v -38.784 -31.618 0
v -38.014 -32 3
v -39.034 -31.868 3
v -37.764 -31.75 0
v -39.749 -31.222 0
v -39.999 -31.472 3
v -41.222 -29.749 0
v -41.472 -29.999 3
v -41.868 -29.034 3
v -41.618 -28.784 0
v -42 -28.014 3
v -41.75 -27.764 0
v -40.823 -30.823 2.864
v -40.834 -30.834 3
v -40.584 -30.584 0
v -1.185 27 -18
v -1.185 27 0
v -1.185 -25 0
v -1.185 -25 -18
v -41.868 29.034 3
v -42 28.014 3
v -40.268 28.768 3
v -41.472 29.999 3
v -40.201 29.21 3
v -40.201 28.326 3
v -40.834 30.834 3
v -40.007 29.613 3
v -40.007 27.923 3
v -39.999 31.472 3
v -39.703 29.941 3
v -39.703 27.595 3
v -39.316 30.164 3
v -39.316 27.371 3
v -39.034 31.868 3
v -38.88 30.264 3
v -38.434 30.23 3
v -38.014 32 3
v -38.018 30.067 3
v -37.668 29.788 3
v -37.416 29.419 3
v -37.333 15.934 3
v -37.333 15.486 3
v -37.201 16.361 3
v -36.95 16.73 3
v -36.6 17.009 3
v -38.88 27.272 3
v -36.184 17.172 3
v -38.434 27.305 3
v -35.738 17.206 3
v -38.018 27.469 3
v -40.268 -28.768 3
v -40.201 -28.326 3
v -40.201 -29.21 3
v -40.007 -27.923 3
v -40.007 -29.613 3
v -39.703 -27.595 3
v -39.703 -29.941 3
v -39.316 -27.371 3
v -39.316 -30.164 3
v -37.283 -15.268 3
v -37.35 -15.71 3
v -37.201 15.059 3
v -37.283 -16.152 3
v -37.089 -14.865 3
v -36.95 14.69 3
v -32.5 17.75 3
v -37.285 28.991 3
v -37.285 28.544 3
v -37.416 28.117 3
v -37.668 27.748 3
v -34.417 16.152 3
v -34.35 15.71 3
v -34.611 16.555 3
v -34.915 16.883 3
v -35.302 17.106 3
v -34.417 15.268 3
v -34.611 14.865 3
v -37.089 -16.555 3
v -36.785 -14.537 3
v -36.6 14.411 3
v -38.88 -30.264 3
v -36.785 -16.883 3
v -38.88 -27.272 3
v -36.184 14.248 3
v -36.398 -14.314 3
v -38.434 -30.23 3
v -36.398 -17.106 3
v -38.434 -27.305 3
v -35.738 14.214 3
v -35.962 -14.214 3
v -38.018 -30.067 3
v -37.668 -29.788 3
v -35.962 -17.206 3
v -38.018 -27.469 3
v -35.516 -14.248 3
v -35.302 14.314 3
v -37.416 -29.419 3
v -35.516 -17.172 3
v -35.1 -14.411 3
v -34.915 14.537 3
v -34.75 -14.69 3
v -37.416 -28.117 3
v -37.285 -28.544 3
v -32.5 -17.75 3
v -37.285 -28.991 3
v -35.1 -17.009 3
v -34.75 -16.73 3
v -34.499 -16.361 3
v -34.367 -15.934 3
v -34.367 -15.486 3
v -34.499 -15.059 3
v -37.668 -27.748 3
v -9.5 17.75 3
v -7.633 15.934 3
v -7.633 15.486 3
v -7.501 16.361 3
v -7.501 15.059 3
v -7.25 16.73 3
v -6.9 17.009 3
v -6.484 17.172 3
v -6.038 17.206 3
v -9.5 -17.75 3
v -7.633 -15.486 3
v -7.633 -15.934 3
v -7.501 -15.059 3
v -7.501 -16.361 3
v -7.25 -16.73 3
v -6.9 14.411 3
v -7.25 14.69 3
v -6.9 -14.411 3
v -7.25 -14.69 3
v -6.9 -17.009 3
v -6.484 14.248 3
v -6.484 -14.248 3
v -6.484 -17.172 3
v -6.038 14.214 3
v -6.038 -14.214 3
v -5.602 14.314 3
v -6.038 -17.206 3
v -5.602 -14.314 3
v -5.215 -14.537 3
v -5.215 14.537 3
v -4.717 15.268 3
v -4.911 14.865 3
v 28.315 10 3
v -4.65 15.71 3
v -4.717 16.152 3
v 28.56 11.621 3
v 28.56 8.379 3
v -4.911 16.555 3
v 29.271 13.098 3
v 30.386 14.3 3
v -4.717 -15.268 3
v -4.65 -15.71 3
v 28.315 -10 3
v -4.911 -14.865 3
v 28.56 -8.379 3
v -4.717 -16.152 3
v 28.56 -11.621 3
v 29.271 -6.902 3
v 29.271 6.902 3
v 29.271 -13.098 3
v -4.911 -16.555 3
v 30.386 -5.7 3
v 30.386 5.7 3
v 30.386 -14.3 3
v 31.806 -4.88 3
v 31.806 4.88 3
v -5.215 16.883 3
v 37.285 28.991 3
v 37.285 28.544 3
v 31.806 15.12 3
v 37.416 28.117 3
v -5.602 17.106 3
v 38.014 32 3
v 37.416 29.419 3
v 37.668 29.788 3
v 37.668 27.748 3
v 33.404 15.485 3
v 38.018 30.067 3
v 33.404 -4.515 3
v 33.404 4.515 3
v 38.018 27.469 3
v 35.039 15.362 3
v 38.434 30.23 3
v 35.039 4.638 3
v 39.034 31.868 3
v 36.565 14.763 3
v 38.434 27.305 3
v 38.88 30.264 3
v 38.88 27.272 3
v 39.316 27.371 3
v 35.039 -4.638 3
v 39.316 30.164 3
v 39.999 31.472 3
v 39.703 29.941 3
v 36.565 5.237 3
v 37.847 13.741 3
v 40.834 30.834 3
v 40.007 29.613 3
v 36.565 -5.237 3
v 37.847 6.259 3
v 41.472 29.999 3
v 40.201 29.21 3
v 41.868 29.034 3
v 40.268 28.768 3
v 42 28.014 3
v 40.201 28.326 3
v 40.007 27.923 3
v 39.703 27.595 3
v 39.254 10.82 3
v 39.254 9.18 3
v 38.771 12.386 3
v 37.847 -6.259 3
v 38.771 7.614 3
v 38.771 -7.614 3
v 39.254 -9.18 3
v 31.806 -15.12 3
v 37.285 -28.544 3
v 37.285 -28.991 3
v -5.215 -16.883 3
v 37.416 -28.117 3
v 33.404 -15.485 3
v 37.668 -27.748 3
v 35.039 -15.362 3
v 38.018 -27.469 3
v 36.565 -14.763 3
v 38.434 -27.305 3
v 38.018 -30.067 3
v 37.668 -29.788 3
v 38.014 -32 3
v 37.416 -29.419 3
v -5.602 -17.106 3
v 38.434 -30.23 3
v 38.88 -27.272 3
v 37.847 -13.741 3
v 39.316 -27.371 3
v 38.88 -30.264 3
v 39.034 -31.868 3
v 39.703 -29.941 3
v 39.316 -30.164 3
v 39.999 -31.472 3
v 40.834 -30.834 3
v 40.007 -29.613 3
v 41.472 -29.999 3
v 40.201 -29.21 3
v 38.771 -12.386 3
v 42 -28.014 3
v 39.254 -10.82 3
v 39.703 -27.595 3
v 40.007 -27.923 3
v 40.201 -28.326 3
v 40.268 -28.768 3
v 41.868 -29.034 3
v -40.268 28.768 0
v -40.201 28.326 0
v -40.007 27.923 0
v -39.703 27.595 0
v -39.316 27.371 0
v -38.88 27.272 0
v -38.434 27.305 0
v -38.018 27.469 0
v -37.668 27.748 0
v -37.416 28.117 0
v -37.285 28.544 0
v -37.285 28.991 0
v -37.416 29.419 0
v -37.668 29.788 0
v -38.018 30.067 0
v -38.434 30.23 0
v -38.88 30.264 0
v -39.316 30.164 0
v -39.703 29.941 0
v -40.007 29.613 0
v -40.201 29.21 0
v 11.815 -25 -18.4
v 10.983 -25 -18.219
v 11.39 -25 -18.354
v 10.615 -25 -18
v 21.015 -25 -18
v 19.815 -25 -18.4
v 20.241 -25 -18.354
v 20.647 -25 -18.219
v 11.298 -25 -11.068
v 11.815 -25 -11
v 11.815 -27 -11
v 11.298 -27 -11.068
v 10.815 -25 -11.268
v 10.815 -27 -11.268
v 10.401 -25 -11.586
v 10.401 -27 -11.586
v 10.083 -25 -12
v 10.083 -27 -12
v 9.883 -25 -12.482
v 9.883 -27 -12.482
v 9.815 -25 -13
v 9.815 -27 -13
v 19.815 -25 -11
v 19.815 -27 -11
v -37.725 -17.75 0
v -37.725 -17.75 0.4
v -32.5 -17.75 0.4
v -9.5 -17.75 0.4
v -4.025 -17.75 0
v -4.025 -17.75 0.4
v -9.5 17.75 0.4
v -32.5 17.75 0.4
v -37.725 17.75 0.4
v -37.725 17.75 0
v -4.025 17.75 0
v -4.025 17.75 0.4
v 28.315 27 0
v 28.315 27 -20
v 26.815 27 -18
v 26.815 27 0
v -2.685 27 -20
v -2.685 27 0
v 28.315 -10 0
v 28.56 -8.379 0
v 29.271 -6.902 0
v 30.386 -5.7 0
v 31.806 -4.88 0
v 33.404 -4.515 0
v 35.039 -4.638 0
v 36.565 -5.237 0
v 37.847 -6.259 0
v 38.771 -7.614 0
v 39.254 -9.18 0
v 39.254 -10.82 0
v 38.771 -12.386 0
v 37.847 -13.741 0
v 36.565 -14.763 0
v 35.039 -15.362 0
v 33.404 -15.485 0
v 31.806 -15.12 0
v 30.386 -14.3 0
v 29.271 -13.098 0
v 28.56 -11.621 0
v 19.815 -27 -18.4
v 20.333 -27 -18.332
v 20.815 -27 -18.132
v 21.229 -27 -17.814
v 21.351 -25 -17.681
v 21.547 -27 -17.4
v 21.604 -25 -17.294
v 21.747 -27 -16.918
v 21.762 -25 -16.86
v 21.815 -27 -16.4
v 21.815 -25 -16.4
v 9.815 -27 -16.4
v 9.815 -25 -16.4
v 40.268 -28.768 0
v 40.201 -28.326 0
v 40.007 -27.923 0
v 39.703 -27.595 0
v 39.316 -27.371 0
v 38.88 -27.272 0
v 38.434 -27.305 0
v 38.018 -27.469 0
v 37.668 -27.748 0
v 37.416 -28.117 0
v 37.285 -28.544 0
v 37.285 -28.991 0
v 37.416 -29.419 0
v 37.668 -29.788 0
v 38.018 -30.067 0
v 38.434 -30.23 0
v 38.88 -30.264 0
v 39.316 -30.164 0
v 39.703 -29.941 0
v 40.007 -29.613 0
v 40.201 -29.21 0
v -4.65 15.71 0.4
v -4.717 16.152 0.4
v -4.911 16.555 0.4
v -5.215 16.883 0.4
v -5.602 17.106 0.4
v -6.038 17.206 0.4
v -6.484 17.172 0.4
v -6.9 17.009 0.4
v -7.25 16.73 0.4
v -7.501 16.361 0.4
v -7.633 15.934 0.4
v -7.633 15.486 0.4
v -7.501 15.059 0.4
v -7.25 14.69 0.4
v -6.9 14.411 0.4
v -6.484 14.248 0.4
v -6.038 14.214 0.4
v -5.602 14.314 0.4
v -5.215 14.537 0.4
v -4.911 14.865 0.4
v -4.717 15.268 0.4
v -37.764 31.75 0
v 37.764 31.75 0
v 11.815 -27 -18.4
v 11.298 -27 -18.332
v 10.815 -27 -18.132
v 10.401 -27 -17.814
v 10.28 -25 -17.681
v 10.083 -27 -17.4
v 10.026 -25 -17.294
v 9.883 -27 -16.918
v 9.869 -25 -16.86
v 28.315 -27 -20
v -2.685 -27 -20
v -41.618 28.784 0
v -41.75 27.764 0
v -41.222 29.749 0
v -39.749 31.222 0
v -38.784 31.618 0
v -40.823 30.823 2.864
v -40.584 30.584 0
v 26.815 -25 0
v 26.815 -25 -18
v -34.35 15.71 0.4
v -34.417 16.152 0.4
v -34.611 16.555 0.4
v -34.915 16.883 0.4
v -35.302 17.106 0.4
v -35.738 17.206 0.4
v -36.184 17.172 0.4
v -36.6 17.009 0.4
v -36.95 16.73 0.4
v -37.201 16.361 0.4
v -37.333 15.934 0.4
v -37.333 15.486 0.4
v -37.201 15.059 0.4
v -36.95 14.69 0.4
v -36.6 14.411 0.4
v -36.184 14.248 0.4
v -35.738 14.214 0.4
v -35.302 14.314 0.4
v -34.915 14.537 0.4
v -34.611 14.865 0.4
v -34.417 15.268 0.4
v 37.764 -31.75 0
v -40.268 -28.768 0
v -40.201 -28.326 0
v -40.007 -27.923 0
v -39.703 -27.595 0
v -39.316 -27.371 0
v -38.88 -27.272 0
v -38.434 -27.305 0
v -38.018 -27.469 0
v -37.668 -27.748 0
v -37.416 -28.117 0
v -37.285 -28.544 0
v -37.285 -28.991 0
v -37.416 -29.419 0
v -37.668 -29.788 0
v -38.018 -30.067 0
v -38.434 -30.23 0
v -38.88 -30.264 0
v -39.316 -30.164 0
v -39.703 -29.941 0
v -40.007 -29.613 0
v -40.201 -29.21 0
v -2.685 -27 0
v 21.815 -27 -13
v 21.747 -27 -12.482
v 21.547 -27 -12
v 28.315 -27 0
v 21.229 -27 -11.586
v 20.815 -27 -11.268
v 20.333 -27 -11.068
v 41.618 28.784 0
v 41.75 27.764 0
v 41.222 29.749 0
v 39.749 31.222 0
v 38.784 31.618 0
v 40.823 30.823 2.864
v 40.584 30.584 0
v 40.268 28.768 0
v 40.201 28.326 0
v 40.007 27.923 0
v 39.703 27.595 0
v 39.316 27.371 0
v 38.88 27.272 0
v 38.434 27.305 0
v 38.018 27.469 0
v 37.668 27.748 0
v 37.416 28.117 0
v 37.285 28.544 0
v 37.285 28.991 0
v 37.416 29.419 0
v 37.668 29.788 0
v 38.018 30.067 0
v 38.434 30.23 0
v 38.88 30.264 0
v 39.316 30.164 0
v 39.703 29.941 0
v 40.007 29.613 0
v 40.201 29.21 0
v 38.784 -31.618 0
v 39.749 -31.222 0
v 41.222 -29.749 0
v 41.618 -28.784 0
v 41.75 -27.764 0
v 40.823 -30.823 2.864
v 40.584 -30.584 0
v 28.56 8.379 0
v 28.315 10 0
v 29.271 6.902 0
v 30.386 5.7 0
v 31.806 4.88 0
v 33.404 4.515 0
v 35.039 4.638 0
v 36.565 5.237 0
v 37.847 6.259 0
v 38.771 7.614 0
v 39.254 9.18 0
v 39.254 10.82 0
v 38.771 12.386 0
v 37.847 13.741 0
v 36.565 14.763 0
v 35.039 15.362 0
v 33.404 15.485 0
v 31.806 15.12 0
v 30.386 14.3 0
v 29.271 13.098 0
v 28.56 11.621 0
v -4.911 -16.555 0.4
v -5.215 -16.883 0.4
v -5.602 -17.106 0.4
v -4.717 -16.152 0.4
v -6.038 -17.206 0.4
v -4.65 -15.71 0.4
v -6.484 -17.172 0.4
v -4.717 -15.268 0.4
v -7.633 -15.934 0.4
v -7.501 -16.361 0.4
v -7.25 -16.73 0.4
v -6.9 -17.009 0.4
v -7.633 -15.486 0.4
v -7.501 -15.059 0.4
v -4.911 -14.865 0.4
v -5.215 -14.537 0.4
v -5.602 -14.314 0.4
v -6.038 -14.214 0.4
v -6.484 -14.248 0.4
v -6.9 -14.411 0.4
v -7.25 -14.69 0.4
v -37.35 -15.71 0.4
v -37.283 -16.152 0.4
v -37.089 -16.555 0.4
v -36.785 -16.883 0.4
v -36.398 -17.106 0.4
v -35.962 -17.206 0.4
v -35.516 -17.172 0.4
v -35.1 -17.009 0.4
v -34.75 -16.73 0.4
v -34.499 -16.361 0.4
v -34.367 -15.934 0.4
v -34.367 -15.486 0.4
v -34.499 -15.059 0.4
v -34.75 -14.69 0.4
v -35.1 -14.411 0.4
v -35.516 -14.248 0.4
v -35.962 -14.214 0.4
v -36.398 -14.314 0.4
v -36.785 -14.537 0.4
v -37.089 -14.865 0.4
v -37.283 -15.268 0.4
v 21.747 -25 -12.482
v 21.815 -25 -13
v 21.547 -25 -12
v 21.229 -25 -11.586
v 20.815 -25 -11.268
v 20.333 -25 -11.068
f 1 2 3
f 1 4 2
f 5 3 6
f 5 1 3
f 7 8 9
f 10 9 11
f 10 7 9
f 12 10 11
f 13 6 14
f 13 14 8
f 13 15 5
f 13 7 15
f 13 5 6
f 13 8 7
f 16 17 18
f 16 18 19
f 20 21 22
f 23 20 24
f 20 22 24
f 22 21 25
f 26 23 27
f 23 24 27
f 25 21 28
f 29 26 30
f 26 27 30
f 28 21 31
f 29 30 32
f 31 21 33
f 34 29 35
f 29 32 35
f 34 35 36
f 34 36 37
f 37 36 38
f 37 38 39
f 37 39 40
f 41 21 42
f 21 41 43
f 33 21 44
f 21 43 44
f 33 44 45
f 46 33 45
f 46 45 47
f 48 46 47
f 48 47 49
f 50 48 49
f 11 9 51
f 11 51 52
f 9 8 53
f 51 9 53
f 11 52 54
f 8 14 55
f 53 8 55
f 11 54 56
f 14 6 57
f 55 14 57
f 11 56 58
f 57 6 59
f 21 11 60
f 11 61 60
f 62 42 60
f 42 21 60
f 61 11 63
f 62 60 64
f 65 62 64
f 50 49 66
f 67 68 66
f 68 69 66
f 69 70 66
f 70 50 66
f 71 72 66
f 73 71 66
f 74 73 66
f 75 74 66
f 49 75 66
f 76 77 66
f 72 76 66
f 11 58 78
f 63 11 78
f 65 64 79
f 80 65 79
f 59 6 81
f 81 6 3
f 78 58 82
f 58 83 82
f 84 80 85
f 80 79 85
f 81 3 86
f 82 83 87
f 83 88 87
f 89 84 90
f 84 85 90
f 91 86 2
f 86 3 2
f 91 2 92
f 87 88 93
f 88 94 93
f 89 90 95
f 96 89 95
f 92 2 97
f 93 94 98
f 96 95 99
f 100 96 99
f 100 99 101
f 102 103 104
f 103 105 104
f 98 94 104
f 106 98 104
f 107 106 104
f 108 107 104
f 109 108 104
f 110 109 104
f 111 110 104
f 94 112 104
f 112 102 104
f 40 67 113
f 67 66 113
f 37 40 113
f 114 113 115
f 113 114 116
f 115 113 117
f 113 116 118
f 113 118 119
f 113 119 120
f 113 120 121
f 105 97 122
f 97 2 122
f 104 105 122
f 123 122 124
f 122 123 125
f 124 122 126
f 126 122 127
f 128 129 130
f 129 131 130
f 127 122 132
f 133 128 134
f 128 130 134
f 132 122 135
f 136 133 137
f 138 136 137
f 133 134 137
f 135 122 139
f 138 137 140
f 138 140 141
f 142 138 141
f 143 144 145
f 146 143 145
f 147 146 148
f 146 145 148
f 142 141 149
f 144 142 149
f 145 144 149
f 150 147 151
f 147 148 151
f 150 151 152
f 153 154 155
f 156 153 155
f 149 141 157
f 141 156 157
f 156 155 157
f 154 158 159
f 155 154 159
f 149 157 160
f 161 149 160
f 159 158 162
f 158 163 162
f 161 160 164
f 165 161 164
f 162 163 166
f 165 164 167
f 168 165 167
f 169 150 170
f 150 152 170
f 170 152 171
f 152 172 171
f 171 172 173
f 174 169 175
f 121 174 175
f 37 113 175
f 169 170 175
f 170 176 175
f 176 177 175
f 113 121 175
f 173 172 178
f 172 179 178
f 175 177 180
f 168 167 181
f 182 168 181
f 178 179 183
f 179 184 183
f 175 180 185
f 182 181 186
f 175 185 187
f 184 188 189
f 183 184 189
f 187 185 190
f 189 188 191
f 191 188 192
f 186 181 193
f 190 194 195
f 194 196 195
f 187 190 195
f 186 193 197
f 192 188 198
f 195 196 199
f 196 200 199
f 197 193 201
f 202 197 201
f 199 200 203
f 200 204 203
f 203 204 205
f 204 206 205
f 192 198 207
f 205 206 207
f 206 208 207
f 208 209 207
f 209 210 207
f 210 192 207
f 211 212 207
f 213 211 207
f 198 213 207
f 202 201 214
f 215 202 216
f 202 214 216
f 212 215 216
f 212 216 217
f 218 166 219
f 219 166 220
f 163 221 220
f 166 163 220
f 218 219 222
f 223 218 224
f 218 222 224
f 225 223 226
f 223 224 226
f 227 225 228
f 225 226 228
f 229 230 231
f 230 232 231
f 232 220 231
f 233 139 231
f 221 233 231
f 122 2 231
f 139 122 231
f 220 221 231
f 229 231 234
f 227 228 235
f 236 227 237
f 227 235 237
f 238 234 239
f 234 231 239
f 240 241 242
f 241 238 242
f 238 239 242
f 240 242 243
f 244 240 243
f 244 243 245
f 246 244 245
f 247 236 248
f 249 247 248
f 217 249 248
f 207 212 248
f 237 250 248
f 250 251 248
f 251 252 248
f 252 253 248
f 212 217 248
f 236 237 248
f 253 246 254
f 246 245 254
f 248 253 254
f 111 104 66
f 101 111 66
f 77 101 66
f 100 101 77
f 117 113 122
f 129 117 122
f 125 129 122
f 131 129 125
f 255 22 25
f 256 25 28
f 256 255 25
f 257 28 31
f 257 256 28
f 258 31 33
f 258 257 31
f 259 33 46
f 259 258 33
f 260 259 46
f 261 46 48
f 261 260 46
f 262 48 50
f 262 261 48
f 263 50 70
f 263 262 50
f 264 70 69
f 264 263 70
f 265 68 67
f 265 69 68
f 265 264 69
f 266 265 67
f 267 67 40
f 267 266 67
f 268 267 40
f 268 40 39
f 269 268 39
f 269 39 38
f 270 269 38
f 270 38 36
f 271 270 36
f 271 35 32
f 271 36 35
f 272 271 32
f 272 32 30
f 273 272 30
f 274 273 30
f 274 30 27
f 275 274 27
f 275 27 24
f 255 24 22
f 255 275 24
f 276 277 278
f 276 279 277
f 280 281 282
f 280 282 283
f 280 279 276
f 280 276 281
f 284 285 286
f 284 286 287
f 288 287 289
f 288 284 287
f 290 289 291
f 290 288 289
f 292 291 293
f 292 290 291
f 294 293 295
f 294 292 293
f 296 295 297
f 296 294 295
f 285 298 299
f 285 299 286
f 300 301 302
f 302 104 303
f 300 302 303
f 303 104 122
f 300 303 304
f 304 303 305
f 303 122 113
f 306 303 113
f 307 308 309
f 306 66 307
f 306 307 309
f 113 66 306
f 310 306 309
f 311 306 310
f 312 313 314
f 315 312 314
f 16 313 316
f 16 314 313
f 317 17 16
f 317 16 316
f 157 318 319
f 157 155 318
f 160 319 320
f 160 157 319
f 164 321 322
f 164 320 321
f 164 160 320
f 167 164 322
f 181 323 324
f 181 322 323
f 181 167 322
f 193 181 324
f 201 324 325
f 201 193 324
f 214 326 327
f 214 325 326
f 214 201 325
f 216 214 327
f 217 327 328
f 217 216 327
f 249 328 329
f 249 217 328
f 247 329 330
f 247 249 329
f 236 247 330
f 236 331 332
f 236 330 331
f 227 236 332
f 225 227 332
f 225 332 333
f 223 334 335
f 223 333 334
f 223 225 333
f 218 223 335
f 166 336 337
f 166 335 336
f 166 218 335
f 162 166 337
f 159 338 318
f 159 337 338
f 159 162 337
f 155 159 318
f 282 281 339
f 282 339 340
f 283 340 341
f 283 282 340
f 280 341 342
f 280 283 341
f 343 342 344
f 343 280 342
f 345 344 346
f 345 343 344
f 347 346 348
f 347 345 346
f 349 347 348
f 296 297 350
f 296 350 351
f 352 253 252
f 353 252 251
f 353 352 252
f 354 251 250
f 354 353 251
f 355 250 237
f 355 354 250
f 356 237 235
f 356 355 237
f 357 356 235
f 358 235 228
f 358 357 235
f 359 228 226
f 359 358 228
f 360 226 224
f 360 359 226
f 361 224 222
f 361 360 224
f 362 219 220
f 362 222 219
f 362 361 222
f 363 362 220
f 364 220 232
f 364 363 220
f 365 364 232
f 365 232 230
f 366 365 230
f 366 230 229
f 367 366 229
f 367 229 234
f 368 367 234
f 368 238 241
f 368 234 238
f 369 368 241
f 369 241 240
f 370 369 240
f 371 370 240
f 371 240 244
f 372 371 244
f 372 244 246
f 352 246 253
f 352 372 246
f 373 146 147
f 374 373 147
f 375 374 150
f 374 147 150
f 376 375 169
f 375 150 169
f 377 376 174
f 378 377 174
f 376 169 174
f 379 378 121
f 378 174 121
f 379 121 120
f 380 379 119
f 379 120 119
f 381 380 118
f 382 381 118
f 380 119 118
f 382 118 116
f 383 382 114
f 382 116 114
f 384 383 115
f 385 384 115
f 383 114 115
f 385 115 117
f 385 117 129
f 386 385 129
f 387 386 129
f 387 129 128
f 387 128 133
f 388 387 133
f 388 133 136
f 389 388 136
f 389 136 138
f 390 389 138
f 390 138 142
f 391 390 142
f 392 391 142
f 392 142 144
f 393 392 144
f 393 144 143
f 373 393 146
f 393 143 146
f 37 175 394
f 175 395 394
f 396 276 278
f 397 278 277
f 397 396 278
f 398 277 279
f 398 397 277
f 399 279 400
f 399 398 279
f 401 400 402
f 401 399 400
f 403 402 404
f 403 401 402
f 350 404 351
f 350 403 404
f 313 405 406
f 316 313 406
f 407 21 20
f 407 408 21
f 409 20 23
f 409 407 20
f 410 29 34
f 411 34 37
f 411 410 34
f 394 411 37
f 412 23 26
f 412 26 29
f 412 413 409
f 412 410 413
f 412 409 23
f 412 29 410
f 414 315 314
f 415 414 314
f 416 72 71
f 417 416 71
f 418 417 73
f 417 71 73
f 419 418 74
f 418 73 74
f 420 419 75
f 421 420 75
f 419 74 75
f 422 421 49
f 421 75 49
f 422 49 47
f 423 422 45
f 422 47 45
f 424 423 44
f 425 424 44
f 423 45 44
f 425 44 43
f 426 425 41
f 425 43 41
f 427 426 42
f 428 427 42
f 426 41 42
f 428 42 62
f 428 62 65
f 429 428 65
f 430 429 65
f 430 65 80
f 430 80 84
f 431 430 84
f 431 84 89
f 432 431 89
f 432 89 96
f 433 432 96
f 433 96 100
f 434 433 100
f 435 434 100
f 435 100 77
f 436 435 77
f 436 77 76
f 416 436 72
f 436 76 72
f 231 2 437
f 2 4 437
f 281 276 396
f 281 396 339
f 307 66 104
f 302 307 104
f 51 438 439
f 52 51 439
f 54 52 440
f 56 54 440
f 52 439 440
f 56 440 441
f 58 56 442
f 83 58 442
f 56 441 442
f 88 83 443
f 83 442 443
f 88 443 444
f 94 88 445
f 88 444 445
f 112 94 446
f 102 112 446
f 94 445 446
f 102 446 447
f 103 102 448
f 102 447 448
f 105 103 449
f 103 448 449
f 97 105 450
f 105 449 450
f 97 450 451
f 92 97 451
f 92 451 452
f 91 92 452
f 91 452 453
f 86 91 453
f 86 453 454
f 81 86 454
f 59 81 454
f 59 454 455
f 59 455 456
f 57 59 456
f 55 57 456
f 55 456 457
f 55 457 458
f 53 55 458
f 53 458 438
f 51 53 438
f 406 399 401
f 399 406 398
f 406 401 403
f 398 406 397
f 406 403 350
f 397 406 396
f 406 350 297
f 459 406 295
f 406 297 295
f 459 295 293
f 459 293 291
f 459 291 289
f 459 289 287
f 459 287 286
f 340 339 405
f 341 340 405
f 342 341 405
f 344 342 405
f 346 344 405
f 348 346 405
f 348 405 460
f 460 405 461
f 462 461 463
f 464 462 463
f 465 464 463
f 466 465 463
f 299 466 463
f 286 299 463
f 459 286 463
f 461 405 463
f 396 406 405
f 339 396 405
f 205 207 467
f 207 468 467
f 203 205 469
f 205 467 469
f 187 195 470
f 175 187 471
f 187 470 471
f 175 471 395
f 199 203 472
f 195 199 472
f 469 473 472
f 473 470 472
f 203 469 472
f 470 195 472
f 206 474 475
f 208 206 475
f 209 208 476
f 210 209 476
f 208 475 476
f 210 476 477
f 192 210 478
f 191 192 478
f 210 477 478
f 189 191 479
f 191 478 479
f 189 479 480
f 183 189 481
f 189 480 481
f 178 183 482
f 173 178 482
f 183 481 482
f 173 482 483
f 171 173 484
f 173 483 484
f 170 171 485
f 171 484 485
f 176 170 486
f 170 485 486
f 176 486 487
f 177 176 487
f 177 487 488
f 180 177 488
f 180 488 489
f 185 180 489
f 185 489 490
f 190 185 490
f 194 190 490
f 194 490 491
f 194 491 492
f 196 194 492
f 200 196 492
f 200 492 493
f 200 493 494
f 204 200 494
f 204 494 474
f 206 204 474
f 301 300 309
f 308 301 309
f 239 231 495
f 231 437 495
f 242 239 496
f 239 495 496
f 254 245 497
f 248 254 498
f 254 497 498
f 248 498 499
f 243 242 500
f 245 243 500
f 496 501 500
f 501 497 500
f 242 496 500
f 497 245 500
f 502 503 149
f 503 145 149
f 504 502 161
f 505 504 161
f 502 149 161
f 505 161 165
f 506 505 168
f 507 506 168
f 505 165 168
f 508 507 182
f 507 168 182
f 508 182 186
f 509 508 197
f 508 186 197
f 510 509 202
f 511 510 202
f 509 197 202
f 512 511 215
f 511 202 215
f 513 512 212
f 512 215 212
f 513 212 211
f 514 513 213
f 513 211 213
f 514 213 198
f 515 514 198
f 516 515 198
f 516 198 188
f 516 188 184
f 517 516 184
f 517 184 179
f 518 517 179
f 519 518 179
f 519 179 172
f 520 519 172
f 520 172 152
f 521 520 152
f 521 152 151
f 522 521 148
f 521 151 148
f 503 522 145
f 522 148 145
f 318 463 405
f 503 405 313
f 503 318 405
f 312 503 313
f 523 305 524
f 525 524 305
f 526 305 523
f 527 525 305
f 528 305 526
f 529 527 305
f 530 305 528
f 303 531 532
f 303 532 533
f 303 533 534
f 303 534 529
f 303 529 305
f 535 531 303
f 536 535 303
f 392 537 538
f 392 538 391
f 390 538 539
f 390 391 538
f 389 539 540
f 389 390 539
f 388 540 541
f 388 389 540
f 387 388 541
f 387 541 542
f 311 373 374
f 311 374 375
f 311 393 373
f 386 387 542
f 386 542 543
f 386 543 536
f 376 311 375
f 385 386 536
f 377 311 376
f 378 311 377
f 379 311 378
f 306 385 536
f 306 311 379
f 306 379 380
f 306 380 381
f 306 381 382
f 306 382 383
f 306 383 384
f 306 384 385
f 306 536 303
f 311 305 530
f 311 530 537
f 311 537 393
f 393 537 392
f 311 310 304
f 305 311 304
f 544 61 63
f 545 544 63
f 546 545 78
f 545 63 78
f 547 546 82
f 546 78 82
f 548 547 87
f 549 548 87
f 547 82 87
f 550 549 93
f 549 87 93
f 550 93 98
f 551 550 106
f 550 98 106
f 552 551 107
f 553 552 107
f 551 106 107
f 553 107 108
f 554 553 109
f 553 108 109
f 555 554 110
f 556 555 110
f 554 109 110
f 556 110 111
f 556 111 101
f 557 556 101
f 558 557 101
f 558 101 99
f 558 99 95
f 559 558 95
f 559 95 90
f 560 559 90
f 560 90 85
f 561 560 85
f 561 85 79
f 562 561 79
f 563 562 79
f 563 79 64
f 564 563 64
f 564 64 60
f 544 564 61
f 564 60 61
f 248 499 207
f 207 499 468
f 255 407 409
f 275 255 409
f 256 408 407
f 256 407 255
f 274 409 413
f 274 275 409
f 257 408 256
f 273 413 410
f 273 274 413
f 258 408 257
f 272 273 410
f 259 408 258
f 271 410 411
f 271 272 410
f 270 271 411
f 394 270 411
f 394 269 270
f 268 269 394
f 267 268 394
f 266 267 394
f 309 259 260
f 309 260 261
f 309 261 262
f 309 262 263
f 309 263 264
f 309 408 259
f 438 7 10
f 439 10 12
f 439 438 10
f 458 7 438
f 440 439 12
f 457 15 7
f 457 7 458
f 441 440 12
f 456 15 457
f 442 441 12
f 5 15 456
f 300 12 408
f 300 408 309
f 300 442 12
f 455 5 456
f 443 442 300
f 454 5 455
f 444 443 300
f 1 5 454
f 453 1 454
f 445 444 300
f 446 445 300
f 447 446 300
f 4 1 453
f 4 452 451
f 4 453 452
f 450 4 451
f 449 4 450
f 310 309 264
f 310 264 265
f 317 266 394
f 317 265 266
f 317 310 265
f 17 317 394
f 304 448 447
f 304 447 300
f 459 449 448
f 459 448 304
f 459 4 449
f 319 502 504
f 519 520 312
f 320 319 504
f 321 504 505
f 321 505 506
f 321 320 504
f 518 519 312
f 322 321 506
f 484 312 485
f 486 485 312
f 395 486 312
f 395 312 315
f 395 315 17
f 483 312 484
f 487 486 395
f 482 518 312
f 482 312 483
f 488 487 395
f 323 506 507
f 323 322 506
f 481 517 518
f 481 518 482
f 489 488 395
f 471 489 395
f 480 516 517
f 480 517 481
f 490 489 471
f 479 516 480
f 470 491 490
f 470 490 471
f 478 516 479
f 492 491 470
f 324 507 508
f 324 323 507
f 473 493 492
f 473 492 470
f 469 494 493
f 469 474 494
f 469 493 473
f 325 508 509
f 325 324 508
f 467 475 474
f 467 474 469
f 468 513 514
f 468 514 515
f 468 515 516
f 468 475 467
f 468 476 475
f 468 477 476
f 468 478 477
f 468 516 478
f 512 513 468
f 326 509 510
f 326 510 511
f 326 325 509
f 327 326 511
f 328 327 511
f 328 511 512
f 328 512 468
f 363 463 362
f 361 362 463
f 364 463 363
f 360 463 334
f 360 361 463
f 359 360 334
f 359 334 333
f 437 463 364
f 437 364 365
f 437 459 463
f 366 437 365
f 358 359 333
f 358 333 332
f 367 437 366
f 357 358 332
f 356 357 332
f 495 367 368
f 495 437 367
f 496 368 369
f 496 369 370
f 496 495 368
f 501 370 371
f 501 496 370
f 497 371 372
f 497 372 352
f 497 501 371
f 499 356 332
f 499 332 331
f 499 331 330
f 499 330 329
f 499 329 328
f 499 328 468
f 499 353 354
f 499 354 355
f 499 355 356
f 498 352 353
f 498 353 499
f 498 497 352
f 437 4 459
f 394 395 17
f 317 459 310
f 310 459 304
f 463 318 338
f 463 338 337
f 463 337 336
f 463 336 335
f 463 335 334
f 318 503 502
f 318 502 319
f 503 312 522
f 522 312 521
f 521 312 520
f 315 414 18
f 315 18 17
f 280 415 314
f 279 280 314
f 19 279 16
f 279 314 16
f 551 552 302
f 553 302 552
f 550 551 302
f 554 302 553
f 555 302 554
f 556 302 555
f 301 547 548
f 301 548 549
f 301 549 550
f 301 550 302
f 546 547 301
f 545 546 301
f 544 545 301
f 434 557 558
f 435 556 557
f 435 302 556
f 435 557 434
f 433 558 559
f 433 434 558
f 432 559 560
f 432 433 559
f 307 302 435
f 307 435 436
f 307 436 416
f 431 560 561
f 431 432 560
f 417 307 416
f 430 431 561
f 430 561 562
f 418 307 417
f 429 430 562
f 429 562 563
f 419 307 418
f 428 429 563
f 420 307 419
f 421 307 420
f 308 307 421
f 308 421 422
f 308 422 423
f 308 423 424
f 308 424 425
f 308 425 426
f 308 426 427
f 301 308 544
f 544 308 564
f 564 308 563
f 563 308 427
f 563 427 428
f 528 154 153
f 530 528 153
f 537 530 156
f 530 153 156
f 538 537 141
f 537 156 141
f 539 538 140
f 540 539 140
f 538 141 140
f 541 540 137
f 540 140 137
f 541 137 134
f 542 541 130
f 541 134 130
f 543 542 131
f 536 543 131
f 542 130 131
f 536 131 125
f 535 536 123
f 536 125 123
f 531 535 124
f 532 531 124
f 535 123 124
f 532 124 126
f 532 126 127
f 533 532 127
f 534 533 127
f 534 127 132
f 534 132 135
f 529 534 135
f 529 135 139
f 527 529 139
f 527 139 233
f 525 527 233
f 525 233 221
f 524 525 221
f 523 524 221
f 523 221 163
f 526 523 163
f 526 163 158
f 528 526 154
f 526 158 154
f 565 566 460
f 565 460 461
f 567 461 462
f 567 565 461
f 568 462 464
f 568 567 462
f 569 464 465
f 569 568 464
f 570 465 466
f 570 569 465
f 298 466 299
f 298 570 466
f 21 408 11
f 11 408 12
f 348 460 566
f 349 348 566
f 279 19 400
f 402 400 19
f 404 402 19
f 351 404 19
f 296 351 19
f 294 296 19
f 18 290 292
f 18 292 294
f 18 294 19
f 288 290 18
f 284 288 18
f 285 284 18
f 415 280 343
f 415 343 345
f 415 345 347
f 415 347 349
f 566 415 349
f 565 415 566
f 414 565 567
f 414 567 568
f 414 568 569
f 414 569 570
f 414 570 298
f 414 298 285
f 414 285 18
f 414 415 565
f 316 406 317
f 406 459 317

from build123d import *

# Parameters (mm, degrees)
SKETCH3_R               = 1.5
CUT_EXTRUDE1_DEPTH      = 10
MIRROR2_COPY_1_SKETCH_R = 1.5
MIRROR2_COPY_1_DEPTH    = 10
FILLET1_R               = 4
SKETCH4_W               = 23
SKETCH4_H               = 17.75
SKETCH4_R               = 1.5
CUT_EXTRUDE2_DEPTH      = 2.6
SKETCH5_W               = 33.7
SKETCH5_H               = 17.75
CUT_EXTRUDE3_DEPTH      = 0.4
BOSS_EXTRUDE1_DEPTH     = 18
SKETCH7_W               = 31
SKETCH7_H               = 54
BOSS_EXTRUDE2_DEPTH     = 2
SKETCH8_W               = 14
SKETCH8_H               = 18
CUT_EXTRUDE4_DEPTH      = 12
CUT_EXTRUDE6_START      = -12
SKETCH9_R               = 5.5
CUT_EXTRUDE6_DEPTH      = 69.462376985
CUT_EXTRUDE8_DEPTH      = 22
SKETCH11_W              = 12
SKETCH11_H              = 2
CUT_EXTRUDE9_DEPTH      = 0.4
FILLET2_R               = 2


with BuildPart() as part:
    # Sketch2 → Loft1 section 0
    with BuildSketch(Plane.XY.offset(3)):
        with BuildLine():
            Line((-42, -32), (42, -32))
            Line((42, -32), (42, 32))
            Line((42, 32), (-42, 32))
            Line((-42, 32), (-42, -32))
        make_face()
    # Sketch1 → Loft1 section 1
    with BuildSketch(Plane.XY):
        with BuildLine():
            Line((-41.75, -31.75), (41.75, -31.75))
            Line((41.75, -31.75), (41.75, 31.75))
            Line((41.75, 31.75), (-41.75, 31.75))
            Line((-41.75, 31.75), (-41.75, -31.75))
        make_face()
    loft()

    # Sketch3 → Cut-Extrude1 (cut)
    with BuildSketch(Plane(origin=(0, 0, 0), x_dir=(-1, 0, 0), z_dir=(0, 0, -1))):
        with Locations((38.767766953, -28.767766953)):
            Circle(SKETCH3_R)
    cut_extrude1 = extrude(amount=-CUT_EXTRUDE1_DEPTH, mode=Mode.SUBTRACT)

    # Mirror1: Cut-Extrude1 across plane
    add(cut_extrude1.mirror(Plane(origin=(0, 0, 0), x_dir=(0, 0, 1), z_dir=(1, 0, 0))), mode=Mode.SUBTRACT)

    # Mirror2: Cut-Extrude1 across plane
    add(cut_extrude1.mirror(Plane.ZX), mode=Mode.SUBTRACT)

    # Mirror2 copy 1 sketch → Mirror2 copy 1 (cut)
    with BuildSketch(Plane(origin=(0, 0, 0), x_dir=(1, 0, 0), z_dir=(0, 0, -1))):
        with Locations((38.767766953, -28.767766953)):
            Circle(MIRROR2_COPY_1_SKETCH_R)
    extrude(amount=-MIRROR2_COPY_1_DEPTH, mode=Mode.SUBTRACT)

    # Fillet1
    fillet1_edges = [part.edges().sort_by_distance(p)[0] for p in [
        (-41.875, 31.875, 1.5),
        (41.875, 31.875, 1.5),
        (41.875, -31.875, 1.5),
        (-41.875, -31.875, 1.5),
    ]]
    fillet(fillet1_edges, radius=FILLET1_R)

    # Sketch4 → Cut-Extrude2 (cut)
    with BuildSketch(Plane.XY.offset(3)):
        with Locations((-21, 8.875)):
            Rectangle(SKETCH4_W, SKETCH4_H)
        with Locations((-21, -8.875)):
            Rectangle(SKETCH4_W, SKETCH4_H)
        with Locations((-35.85, 15.71)):
            Circle(SKETCH4_R)
        with Locations((-6.15, -15.71)):
            Circle(SKETCH4_R)
        with Locations((-6.15, 15.71)):
            Circle(SKETCH4_R)
        with Locations(Location((-35.85, -15.71, 0), (0, 0, 180))):
            Circle(SKETCH4_R)
    extrude(amount=-CUT_EXTRUDE2_DEPTH, mode=Mode.SUBTRACT)

    # Sketch5 → Cut-Extrude3 (cut)
    with BuildSketch(Plane(origin=(0, 0, 0), x_dir=(-1, 0, 0), z_dir=(0, 0, -1))):
        with Locations((20.875, -8.875)):
            Rectangle(SKETCH5_W, SKETCH5_H)
        with Locations((20.875, 8.875)):
            Rectangle(SKETCH5_W, SKETCH5_H)
    extrude(amount=-CUT_EXTRUDE3_DEPTH, mode=Mode.SUBTRACT)

    # Sketch6 → Boss-Extrude1 (add)
    with BuildSketch(Plane(origin=(0, 0, 0), x_dir=(-1, 0, 0), z_dir=(0, 0, -1))):
        Polygon((2.684756285, -27), (2.684756285, 0), (1.184756285, 0), (1.184756285, -25), (-26.815243715, -25), (-26.815243715, 0), (-28.315243715, 0), (-28.315243715, -27), align=None)
        Polygon((2.684756285, 0), (2.684756285, 27), (-28.315243715, 27), (-28.315243715, 0), (-26.815243715, 0), (-26.815243715, 25), (1.184756285, 25), (1.184756285, 0), align=None)
    extrude(amount=BOSS_EXTRUDE1_DEPTH)

    # Sketch7 → Boss-Extrude2 (add)
    with BuildSketch(Plane(origin=(0, 0, -18), x_dir=(-1, 0, 0), z_dir=(0, 0, -1))):
        with Locations((-12.815243715, 0)):
            Rectangle(SKETCH7_W, SKETCH7_H)
    extrude(amount=BOSS_EXTRUDE2_DEPTH)

    # Sketch8 → Cut-Extrude4 (cut)
    with BuildSketch(Plane(origin=(0, 27, 0), x_dir=(1, 0, 0), z_dir=(0, 1, 0))):
        with Locations((5.815243715, 9)):
            Rectangle(SKETCH8_W, SKETCH8_H)
        with Locations((19.815243715, 9)):
            Rectangle(SKETCH8_W, SKETCH8_H)
    extrude(amount=-CUT_EXTRUDE4_DEPTH, mode=Mode.SUBTRACT)

    # Sketch9 → Cut-Extrude6 (cut)
    with BuildSketch(Plane(origin=(0, 0, 0), x_dir=(-1, 0, 0), z_dir=(0, 0, -1)).offset(CUT_EXTRUDE6_START)):
        with Locations((-33.815243715, -10)):
            Circle(SKETCH9_R)
    cut_extrude6 = extrude(amount=CUT_EXTRUDE6_DEPTH, mode=Mode.SUBTRACT)

    # Mirror3: Cut-Extrude6 across plane
    add(cut_extrude6.mirror(Plane.ZX), mode=Mode.SUBTRACT)

    # Sketch10 → Cut-Extrude8 (cut)
    with BuildSketch(Plane(origin=(0, -25, 0), x_dir=(1, 0, 0), z_dir=(0, 1, 0))):
        Polygon((15.815243715, 18), (21.815243715, 18), (21.815243715, 11), (9.815243715, 11), (9.815243715, 18), align=None)
    extrude(amount=-CUT_EXTRUDE8_DEPTH, mode=Mode.SUBTRACT)

    # Sketch11 → Cut-Extrude9 (cut)
    with BuildSketch(Plane.XY.offset(-18)):
        with Locations((15.815243715, -26)):
            Rectangle(SKETCH11_W, SKETCH11_H)
    extrude(amount=-CUT_EXTRUDE9_DEPTH, mode=Mode.SUBTRACT)

    # Fillet2
    # the kernel refuses this fillet: 2 mm, written as the material it adds along each edge
    with BuildSketch(Plane(origin=(21.815243715, -25, -11), x_dir=(0, 0, -1), z_dir=(0, -1, 0)), Plane(origin=(9.815243715, -27, -18.4), x_dir=(1, 0, 0), z_dir=(0, 1, 0))) as fillet2_piece_1:
        with BuildLine():
            CenterArc((FILLET2_R, -FILLET2_R), FILLET2_R, 90, 90)
            Line((0, -FILLET2_R), (0, 0))
            Line((0, 0), (FILLET2_R, 0))
        make_face()
    extrude(amount=2)
    with BuildSketch(Plane(origin=(9.815243715, -25, -11), x_dir=(0, 0, -1), z_dir=(0, -1, 0)), Plane(origin=(21.815243715, -25, -18.4), x_dir=(0, 0, 1), z_dir=(0, -1, 0))) as fillet2_piece_2:
        with BuildLine():
            CenterArc((FILLET2_R, FILLET2_R), FILLET2_R, 180, 90)
            Line((0, FILLET2_R), (0, 0))
            Line((0, 0), (FILLET2_R, 0))
        make_face()
    extrude(amount=2)


solid = part.part
